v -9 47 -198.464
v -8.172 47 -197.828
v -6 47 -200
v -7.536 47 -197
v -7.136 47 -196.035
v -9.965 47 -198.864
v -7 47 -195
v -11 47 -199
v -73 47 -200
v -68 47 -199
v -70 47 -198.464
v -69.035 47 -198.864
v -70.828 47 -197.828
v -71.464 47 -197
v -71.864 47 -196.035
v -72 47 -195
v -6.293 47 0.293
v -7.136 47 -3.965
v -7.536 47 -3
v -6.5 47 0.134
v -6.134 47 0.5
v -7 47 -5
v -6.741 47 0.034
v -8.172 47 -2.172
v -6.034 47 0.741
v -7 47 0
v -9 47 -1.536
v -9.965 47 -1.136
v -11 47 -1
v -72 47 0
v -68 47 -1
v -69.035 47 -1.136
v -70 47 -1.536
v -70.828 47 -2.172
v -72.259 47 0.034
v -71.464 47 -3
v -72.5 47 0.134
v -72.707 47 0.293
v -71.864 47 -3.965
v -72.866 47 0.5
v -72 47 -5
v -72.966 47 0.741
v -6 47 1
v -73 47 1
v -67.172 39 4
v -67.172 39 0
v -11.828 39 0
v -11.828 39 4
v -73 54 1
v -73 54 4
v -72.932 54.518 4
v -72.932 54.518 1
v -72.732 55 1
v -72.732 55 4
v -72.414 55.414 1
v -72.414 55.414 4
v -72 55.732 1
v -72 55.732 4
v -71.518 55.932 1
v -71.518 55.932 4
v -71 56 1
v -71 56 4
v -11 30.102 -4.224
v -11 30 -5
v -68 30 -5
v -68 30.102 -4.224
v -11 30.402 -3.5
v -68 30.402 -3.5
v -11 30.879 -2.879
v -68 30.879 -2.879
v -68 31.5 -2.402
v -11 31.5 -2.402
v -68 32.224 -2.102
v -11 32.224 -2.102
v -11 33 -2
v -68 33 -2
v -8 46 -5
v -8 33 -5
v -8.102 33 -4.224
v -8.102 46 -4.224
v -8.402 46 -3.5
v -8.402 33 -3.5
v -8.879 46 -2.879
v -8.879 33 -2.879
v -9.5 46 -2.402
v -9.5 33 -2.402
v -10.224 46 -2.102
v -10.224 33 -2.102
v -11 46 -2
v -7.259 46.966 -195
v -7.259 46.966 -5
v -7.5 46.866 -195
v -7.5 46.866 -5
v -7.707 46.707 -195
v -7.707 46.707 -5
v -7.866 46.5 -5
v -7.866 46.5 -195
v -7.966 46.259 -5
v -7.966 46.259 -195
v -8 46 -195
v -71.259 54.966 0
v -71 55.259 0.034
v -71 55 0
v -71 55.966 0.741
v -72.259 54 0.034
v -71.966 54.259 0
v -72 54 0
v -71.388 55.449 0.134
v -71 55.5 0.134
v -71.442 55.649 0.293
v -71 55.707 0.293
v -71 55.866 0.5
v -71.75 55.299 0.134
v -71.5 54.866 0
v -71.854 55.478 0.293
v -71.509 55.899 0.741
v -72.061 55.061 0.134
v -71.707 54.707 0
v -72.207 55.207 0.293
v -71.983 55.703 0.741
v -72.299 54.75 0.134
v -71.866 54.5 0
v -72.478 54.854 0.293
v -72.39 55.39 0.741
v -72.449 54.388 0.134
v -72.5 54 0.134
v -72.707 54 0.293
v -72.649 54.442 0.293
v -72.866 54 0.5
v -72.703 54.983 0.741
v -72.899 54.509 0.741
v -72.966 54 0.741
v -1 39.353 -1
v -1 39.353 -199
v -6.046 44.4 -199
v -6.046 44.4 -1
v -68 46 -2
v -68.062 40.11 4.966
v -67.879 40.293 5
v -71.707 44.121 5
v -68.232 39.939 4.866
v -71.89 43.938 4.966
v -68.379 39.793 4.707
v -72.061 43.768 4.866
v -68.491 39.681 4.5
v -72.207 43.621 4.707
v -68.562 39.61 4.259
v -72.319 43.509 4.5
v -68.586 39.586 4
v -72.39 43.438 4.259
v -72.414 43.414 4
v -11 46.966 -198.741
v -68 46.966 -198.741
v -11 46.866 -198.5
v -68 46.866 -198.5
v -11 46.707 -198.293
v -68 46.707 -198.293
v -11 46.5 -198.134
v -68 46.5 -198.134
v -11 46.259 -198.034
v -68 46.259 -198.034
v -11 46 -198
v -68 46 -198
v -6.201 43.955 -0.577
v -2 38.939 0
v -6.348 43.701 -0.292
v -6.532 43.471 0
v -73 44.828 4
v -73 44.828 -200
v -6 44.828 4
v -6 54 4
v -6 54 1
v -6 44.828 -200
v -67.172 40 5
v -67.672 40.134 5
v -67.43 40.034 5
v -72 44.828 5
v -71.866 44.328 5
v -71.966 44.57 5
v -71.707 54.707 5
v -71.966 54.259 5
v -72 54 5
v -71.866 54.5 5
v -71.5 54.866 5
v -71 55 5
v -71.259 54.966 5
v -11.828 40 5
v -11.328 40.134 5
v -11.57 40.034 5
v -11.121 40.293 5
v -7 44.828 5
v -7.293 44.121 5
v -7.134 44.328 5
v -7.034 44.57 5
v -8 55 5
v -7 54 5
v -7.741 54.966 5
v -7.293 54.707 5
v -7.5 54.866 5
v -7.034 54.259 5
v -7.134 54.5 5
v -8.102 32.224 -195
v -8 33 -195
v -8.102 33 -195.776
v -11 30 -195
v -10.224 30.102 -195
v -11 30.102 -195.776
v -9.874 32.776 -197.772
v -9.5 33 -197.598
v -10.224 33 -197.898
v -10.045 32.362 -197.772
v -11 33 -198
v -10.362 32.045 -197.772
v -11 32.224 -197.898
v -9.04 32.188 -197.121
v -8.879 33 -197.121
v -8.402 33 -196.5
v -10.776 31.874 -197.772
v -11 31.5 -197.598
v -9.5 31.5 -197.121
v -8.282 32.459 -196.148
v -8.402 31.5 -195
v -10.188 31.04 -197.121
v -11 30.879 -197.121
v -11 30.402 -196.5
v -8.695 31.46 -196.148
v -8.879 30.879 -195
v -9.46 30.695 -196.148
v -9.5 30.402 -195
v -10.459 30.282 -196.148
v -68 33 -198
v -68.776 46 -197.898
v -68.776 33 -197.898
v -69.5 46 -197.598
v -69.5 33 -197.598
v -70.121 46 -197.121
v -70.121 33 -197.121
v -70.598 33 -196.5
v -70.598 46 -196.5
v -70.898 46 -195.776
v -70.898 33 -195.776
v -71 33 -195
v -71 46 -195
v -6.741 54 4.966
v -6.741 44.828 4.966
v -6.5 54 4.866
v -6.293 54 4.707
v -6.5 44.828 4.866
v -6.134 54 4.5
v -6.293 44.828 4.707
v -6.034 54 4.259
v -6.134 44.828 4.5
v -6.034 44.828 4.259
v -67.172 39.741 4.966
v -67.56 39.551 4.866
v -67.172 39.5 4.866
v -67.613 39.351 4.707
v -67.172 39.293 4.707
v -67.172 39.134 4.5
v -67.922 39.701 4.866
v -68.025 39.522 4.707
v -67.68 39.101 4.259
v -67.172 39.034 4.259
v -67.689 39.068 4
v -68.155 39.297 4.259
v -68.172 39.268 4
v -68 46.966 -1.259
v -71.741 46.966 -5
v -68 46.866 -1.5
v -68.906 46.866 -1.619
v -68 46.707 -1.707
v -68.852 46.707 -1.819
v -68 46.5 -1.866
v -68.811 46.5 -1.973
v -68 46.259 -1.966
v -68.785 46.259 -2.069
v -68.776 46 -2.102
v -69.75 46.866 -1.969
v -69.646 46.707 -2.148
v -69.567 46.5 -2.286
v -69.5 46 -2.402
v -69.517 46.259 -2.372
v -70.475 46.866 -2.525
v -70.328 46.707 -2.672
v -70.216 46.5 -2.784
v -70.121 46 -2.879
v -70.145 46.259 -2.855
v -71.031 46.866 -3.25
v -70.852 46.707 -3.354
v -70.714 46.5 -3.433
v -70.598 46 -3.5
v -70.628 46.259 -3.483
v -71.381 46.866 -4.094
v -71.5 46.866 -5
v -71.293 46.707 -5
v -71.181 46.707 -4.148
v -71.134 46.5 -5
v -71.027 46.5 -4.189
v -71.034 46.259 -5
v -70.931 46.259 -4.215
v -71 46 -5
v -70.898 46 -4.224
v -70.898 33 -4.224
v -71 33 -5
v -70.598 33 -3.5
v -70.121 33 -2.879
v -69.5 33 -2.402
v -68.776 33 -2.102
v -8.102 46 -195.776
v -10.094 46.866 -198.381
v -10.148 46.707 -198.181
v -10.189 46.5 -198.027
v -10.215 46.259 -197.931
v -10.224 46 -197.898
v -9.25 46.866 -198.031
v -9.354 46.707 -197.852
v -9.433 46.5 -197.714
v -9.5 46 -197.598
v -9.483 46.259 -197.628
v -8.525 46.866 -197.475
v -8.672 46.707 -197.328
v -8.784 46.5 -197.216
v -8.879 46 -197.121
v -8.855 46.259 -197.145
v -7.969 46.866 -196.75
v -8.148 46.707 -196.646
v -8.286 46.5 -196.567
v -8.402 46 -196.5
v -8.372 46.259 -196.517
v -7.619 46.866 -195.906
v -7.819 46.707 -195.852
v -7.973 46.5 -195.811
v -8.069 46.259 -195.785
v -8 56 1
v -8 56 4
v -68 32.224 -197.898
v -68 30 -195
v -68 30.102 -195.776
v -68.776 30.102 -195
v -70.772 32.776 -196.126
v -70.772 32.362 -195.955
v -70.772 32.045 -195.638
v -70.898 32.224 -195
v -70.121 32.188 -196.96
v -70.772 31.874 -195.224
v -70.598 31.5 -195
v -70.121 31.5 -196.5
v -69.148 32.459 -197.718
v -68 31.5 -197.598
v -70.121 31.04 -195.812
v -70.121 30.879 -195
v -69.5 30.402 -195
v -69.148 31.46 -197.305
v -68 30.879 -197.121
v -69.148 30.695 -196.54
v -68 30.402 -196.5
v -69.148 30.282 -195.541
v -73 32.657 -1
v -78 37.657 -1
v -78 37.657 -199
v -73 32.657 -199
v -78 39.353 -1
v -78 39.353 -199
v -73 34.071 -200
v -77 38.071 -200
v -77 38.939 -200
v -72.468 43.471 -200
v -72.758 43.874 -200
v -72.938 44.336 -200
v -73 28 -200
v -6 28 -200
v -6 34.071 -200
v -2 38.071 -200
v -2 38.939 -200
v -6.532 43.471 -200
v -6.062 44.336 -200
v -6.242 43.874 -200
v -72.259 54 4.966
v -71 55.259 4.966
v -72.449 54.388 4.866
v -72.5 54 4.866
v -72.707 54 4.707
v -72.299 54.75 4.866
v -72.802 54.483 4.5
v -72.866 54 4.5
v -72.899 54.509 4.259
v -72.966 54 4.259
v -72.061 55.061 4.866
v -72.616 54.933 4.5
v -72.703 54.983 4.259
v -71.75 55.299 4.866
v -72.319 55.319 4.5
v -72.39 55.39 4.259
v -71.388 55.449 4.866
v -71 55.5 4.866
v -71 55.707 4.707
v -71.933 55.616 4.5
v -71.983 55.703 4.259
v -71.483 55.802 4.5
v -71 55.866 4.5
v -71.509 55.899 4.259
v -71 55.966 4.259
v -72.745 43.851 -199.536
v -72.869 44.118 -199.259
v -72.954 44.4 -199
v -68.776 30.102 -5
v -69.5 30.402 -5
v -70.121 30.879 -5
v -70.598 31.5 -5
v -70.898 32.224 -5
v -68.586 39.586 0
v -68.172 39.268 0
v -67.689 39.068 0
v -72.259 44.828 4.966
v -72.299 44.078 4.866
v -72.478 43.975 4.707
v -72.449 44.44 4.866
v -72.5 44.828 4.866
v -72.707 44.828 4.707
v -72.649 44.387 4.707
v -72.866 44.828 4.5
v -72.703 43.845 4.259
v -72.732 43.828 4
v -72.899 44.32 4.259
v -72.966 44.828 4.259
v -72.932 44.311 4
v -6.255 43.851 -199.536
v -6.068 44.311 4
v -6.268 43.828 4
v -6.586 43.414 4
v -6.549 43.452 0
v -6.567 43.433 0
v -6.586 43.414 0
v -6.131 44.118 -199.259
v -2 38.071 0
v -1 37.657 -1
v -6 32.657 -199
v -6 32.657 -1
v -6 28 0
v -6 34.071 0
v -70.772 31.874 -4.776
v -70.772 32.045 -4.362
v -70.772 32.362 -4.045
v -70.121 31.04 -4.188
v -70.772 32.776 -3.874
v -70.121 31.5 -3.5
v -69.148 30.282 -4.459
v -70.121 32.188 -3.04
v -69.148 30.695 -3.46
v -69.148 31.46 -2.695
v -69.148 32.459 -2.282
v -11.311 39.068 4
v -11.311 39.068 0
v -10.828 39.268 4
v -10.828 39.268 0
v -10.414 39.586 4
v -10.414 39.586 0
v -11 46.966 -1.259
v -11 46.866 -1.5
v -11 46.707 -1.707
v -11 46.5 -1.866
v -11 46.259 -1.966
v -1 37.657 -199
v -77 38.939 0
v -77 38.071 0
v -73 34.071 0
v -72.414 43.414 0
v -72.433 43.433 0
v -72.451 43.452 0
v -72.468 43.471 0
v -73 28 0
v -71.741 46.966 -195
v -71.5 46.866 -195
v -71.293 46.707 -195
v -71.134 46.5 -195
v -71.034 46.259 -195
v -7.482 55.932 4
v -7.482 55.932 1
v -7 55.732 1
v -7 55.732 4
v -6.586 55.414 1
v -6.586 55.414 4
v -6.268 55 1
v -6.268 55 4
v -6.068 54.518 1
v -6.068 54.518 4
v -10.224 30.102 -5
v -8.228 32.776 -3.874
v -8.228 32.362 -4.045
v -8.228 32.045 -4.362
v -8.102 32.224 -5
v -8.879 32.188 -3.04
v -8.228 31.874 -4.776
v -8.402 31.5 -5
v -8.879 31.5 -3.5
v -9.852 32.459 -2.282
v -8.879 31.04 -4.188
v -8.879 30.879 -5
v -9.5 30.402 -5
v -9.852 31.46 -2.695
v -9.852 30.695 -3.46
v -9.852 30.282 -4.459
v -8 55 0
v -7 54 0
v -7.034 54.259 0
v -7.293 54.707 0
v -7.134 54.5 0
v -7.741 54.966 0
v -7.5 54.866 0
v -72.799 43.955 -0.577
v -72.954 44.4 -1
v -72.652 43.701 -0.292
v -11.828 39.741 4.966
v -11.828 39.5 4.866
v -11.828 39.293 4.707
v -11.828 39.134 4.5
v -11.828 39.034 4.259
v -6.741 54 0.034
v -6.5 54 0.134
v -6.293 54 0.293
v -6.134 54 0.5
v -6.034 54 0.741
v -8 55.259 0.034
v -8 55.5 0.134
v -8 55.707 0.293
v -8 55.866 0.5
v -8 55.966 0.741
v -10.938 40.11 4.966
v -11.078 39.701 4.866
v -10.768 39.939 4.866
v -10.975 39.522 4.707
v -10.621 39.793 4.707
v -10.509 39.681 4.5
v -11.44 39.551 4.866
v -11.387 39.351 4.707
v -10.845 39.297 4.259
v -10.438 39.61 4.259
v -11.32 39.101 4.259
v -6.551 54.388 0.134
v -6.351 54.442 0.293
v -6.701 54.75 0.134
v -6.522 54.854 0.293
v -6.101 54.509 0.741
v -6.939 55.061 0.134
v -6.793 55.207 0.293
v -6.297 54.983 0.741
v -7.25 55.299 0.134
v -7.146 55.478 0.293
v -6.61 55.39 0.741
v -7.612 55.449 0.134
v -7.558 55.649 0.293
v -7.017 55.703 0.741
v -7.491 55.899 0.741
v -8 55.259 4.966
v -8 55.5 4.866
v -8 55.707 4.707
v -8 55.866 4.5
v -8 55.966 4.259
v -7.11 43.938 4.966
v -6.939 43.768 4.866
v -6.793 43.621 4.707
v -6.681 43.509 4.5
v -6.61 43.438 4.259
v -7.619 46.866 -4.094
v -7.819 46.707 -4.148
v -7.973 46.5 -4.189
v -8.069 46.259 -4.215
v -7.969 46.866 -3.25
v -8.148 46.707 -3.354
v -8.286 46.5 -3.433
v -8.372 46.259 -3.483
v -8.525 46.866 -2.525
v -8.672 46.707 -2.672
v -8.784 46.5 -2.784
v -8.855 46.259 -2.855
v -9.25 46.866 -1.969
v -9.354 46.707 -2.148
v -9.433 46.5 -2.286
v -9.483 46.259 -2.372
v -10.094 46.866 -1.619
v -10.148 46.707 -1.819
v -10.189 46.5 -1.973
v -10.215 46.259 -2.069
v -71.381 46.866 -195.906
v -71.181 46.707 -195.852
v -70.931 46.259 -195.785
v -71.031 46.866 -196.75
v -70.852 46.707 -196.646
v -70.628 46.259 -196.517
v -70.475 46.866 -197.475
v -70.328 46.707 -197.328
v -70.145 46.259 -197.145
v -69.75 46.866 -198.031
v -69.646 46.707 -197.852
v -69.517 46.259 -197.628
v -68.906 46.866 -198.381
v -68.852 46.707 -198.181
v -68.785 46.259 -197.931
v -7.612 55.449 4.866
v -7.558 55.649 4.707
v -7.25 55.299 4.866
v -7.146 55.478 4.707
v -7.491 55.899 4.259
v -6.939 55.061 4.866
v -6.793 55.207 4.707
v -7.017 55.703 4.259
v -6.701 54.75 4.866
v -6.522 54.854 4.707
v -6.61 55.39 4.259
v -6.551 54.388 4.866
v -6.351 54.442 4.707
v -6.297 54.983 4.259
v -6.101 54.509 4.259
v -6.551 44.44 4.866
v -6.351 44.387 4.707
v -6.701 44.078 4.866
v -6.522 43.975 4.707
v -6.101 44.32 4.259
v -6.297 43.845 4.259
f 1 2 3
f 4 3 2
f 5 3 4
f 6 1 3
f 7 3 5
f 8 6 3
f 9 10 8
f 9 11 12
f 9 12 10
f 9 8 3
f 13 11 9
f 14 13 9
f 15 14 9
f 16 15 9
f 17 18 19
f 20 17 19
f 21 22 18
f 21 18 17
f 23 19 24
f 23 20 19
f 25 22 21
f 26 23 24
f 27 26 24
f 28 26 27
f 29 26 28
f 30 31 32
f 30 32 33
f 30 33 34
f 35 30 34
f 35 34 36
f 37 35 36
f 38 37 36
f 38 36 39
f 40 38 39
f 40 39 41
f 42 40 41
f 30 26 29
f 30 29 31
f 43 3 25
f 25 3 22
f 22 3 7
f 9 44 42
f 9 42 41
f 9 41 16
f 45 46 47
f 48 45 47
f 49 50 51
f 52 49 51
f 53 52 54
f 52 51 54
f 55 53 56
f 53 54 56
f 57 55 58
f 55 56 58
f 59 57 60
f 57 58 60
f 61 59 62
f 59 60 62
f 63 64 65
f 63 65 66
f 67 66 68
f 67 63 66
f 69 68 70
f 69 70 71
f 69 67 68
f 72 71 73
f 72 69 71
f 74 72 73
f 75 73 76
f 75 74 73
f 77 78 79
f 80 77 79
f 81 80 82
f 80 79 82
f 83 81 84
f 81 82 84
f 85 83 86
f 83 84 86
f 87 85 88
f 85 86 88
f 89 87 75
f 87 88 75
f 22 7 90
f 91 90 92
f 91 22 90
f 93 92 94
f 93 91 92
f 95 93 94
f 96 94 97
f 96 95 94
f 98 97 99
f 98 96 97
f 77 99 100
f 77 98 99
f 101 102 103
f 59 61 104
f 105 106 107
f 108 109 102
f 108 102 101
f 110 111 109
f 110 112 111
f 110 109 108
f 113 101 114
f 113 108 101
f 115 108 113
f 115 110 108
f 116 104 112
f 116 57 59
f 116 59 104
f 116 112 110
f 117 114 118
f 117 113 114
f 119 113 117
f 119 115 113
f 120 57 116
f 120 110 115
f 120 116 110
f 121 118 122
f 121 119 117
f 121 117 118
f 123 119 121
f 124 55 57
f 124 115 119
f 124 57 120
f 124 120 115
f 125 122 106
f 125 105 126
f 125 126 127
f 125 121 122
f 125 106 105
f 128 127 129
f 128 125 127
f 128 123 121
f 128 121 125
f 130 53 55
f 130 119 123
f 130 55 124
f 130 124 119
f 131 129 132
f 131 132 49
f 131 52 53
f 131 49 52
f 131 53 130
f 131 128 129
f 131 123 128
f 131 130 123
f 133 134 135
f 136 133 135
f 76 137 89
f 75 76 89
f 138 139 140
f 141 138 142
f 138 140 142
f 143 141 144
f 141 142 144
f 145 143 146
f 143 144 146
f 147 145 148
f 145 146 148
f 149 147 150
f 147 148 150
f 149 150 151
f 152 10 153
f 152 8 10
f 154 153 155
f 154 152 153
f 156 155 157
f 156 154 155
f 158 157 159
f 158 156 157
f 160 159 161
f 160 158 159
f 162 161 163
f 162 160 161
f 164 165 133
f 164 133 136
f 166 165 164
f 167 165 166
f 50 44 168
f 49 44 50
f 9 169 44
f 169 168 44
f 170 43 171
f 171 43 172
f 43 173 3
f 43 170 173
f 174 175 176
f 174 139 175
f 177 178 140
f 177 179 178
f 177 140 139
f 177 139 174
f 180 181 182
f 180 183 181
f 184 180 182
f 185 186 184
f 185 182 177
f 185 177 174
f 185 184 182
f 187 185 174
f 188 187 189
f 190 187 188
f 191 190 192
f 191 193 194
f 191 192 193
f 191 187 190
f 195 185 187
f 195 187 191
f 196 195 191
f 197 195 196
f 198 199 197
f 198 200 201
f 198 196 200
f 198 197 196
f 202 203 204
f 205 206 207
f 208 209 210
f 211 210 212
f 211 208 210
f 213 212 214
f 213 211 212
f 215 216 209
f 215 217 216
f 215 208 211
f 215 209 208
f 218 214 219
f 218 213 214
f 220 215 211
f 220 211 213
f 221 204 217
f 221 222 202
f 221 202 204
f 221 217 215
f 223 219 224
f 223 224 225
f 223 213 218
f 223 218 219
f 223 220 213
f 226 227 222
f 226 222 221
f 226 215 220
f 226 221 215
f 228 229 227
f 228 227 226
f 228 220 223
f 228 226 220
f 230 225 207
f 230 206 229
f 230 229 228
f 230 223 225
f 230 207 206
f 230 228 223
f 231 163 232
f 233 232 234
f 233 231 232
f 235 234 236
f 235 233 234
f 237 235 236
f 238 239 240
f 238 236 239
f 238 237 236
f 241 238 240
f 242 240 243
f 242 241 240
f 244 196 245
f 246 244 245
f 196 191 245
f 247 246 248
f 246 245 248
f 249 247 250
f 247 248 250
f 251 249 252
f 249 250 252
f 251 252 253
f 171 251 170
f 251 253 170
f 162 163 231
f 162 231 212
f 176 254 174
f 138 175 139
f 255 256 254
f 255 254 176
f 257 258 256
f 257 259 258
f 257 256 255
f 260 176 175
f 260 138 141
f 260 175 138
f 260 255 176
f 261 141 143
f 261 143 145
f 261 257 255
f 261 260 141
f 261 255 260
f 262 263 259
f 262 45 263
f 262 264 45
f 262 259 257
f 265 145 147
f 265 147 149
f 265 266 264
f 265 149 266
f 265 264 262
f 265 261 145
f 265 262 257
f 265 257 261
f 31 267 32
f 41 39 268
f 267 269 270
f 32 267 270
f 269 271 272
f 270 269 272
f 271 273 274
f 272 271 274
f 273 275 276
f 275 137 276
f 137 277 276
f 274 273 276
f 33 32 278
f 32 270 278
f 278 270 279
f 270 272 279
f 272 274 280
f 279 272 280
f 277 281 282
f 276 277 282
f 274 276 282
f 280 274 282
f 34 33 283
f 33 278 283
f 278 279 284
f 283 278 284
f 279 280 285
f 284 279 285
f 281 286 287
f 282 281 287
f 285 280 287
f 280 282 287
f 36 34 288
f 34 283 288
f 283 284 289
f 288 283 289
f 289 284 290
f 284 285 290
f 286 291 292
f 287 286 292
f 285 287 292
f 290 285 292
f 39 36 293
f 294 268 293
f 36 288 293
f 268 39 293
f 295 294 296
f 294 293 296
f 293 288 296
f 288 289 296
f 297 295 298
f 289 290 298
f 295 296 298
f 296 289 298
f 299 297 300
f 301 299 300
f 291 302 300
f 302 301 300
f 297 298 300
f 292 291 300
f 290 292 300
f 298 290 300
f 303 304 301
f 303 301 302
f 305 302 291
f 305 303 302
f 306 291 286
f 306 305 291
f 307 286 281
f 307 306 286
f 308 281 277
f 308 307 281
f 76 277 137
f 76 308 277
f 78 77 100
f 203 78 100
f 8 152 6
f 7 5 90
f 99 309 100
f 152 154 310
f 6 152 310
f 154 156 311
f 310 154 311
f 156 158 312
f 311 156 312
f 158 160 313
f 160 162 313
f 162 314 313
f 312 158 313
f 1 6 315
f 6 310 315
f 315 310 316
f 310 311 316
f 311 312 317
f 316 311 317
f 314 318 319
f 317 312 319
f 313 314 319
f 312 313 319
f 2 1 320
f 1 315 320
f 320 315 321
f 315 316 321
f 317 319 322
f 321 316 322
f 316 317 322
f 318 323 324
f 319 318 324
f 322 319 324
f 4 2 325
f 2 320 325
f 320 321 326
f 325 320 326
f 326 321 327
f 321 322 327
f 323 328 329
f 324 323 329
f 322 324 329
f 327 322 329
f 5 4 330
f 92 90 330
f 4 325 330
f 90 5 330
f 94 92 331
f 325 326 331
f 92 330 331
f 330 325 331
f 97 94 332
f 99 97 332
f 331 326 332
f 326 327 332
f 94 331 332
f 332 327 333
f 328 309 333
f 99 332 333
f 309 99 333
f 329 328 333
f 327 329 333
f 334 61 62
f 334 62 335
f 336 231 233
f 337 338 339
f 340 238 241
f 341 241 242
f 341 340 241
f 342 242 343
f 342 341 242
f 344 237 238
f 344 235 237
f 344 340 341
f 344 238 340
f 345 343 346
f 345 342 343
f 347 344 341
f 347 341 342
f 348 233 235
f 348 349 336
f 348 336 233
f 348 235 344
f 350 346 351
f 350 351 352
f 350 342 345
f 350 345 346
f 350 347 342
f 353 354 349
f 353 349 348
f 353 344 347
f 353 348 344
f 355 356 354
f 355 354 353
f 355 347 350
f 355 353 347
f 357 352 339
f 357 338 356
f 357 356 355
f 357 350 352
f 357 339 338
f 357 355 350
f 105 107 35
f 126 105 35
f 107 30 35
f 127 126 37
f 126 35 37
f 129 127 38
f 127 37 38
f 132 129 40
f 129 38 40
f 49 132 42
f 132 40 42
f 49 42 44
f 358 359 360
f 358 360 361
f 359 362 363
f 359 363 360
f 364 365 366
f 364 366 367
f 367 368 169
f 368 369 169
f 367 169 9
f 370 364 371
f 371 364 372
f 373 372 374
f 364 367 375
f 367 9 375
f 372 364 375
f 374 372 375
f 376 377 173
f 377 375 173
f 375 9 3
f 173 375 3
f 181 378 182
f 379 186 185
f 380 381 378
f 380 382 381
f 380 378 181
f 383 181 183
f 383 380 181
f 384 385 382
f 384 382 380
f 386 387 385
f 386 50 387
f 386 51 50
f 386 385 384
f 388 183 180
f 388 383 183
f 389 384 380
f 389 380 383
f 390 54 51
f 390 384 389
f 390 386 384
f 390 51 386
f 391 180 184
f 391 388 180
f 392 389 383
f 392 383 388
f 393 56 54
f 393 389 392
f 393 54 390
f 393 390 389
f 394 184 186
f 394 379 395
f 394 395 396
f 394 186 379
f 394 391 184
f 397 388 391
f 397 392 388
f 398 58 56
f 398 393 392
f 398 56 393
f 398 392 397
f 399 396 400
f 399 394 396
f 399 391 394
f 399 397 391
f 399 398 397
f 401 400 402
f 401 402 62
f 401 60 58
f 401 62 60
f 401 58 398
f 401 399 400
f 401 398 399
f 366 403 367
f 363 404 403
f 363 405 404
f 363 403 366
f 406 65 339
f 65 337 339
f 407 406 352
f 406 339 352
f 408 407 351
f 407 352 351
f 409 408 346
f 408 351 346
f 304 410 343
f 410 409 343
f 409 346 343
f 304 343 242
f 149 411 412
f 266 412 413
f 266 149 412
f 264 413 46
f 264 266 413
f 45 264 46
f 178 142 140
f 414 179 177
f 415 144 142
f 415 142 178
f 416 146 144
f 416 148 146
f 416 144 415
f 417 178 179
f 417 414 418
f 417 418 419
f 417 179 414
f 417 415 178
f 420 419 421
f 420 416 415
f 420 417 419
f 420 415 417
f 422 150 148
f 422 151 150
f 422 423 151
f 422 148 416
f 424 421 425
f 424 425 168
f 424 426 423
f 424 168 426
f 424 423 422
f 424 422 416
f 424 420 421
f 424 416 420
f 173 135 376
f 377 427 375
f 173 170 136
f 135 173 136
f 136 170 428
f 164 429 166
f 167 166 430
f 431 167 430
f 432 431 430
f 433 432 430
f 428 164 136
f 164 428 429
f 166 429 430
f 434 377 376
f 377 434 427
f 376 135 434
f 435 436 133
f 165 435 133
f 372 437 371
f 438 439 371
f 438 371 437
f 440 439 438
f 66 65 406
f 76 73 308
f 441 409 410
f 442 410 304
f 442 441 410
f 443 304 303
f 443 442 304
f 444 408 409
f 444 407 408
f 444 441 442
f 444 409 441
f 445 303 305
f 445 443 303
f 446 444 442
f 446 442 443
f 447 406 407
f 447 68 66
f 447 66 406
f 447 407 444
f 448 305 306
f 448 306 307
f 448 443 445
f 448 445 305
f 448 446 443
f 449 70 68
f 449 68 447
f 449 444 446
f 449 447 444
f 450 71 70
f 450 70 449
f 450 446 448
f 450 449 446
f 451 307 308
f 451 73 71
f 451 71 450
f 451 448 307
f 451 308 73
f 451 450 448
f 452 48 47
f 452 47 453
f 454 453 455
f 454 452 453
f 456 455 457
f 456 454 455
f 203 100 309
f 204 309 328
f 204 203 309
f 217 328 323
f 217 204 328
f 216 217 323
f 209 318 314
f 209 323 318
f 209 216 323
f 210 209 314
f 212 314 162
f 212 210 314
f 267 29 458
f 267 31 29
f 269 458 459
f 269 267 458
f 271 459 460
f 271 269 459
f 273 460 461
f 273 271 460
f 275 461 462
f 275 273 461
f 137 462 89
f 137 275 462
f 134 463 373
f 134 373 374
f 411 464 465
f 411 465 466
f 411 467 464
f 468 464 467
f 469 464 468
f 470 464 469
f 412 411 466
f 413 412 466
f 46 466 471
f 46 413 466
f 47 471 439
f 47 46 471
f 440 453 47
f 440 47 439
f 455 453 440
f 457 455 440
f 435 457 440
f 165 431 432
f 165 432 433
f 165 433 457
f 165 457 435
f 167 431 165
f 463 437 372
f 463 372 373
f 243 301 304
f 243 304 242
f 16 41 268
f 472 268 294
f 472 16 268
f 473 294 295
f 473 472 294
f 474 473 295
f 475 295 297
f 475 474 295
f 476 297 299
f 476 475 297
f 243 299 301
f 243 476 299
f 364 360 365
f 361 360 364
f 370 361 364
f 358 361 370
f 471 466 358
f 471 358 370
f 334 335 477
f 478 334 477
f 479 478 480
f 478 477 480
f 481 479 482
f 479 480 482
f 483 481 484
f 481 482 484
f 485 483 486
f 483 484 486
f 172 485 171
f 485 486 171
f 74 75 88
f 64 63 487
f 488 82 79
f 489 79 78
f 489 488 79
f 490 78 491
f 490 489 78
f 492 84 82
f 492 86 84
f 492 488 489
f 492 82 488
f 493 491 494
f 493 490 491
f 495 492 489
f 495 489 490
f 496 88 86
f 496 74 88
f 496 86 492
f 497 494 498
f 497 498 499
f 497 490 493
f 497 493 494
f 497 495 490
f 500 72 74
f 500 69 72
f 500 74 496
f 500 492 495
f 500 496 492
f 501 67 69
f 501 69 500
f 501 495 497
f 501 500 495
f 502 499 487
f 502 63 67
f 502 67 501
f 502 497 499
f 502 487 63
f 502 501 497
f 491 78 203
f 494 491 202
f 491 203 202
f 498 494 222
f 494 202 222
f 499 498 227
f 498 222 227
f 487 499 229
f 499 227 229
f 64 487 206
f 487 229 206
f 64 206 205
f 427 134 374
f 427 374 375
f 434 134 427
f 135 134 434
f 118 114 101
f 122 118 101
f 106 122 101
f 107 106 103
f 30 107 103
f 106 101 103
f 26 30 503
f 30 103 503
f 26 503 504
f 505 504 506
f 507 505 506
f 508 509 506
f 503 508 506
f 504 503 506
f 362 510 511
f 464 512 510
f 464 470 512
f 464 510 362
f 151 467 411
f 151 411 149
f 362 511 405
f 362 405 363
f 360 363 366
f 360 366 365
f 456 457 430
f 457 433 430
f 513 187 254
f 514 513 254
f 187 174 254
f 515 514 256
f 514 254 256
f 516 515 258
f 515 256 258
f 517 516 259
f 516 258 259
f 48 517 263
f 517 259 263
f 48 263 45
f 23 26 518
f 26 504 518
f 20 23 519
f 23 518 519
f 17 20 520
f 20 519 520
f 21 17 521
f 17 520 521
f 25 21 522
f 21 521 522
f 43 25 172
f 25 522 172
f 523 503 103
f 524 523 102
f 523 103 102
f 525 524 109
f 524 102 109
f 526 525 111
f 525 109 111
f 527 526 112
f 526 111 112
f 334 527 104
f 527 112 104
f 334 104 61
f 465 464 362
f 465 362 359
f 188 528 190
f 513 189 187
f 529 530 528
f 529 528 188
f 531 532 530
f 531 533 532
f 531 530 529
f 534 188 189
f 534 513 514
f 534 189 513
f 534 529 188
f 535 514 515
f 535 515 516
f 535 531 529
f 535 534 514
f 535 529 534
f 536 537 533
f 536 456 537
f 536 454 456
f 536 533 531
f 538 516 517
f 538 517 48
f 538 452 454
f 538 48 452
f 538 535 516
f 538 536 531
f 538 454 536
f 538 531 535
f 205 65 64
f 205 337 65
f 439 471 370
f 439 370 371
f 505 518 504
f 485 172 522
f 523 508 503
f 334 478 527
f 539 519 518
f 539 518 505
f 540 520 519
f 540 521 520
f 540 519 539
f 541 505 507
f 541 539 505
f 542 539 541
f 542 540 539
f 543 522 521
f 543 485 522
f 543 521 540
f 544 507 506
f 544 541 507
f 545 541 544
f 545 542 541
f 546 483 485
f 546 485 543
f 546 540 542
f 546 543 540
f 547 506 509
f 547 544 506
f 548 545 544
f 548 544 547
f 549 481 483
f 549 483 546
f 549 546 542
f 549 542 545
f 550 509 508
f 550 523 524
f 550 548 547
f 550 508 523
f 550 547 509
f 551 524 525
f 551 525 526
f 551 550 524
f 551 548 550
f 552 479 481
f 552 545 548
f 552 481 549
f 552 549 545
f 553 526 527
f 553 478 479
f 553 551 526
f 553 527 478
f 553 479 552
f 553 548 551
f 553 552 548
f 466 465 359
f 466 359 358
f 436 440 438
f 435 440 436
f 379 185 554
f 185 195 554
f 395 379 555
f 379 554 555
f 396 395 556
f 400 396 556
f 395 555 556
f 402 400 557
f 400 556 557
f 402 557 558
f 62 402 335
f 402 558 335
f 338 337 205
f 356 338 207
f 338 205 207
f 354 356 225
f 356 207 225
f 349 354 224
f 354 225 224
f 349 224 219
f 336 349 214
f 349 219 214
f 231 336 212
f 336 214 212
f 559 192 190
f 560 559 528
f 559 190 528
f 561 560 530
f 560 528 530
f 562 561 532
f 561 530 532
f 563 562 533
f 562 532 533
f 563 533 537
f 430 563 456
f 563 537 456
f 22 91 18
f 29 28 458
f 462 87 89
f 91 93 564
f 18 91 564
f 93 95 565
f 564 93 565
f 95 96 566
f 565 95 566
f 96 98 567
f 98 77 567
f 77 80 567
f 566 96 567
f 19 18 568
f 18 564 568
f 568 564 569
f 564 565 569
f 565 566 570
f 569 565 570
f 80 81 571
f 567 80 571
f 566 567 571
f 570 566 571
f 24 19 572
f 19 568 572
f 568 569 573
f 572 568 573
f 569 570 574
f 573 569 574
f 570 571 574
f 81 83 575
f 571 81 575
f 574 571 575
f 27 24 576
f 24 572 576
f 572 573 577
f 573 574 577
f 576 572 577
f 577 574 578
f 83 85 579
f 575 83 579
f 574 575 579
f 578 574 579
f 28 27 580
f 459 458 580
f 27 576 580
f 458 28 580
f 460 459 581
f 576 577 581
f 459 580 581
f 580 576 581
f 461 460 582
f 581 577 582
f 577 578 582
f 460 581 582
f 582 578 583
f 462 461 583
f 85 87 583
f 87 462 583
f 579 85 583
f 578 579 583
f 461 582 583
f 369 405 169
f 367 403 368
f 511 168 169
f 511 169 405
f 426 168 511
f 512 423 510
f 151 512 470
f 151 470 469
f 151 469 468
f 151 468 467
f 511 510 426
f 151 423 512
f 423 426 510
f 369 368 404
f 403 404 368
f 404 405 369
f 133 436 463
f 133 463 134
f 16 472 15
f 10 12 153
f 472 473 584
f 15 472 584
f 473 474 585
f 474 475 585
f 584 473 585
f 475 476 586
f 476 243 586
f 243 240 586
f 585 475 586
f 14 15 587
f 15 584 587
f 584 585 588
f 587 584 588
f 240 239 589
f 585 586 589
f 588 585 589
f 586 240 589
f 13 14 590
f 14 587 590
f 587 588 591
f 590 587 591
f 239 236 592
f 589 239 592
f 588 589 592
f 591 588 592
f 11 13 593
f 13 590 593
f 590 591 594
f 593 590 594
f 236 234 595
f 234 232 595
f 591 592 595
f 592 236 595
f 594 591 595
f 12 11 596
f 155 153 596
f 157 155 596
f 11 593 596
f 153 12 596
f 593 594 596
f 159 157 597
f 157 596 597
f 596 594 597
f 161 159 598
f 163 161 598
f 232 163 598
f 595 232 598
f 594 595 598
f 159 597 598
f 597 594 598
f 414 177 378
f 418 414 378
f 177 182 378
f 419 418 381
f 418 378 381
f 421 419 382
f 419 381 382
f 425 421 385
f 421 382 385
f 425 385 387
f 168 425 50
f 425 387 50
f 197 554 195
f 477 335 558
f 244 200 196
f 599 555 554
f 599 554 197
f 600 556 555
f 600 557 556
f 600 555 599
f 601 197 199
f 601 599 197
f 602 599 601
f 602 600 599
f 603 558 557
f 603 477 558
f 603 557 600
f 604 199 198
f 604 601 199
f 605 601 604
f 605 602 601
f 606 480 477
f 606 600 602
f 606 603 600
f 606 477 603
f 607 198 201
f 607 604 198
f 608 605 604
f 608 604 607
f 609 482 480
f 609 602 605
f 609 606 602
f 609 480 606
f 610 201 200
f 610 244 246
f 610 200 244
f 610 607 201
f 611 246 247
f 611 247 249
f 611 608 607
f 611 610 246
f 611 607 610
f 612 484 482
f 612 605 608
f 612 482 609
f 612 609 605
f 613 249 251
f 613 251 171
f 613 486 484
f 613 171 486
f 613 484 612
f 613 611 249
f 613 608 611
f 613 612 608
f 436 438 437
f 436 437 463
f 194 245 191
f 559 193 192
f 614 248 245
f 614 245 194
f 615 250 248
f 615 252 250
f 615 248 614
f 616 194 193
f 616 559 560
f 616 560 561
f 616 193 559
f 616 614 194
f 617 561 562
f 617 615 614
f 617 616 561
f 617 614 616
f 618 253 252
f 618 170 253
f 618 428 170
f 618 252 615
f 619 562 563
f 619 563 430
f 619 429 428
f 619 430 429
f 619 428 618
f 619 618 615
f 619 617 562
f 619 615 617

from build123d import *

# Parameters (mm, degrees)
EXTRUDE_1_DEPTH     = 200
SKETCH_2_W          = 63
SKETCH_2_H          = 196
CUT_EXTRUDE_1_DEPTH = 17
SKETCH_3_W          = 67
SKETCH_3_H          = 17
EXTRUDE_2_DEPTH     = 5
CHAMFER_1_SIZE      = 5
FILLET_1_R          = 2
FILLET_2_R          = 1
FILLET_3_R          = 3
FILLET_4_R          = 1
CHAMFER_2_SIZE      = 1


with BuildPart() as part:
    # 草图1 → 凸台-拉伸1 (new body)
    with BuildSketch(Plane.XY):
        Polygon((-73, 28), (-6, 28), (-6, 32.656854249), (-1, 37.656854249), (-1, 39.353196257), (-6, 44.353196257), (-6, 47), (-73, 47), (-73, 44.353196257), (-78, 39.353196257), (-78, 37.656854249), (-73, 32.656854249), align=None)
    extrude(amount=-EXTRUDE_1_DEPTH)

    # 草图2 → 切除-拉伸1 (cut)
    with BuildSketch(Plane(origin=(0, 47, 0), x_dir=(1, 0, 0), z_dir=(0, 1, 0))):
        with Locations((-39.5, 100)):
            Rectangle(SKETCH_2_W, SKETCH_2_H)
    extrude(amount=-CUT_EXTRUDE_1_DEPTH, mode=Mode.SUBTRACT)

    # 草图3 → 凸台-拉伸2 (add)
    with BuildSketch(Plane.XY):
        with Locations((-39.5, 47.5)):
            Rectangle(SKETCH_3_W, SKETCH_3_H)
    extrude(amount=EXTRUDE_2_DEPTH)

    # 倒角1
    chamfer_1_edges = [part.edges().sort_by_distance(p)[0] for p in [
        (-73, 39, 2.5),
        (-6, 39, 2.5),
    ]]
    chamfer(chamfer_1_edges, length=CHAMFER_1_SIZE)

    # 圆角1
    fillet_1_edges = [part.edges().sort_by_distance(p)[0] for p in [
        (-6, 56, 2.5),
        (-6, 44, 2.5),
        (-11, 39, 2.5),
        (-68, 39, 2.5),
        (-73, 44, 2.5),
        (-73, 56, 2.5),
    ]]
    fillet(fillet_1_edges, radius=FILLET_1_R)

    # 圆角2
    fillet_2_edges = [part.edges().sort_by_distance(p)[0] for p in [
        (-6, 50.5, 0),
        (-39.5, 56, 0),
        (-39.5, 56, 5),
        (-73, 50.5, 0),
        (-72.414213562, 55.414213562, 0),
        (-6.585786438, 55.414213562, 0),
        (-6, 49.414213562, 5),
        (-39.5, 39, 5),
        (-8.5, 41.5, 5),
        (-73, 49.414213562, 5),
        (-70.5, 41.5, 5),
        (-72.414213562, 55.414213562, 5),
        (-72.847759065, 44.06306026, 5),
        (-67.93693974, 39.152240935, 5),
        (-11.06306026, 39.152240935, 5),
        (-6.152240935, 44.06306026, 5),
        (-6.585786438, 55.414213562, 5),
    ]]
    fillet(fillet_2_edges, radius=FILLET_2_R)

    # 圆角3
    fillet_3_edges = [part.edges().sort_by_distance(p)[0] for p in [
        (-39.5, 30, -2),
        (-8, 38.5, -2),
        (-8, 30, -100),
        (-8, 38.5, -198),
        (-39.5, 30, -198),
        (-71, 38.5, -198),
        (-71, 30, -100),
        (-71, 38.5, -2),
    ]]
    fillet(fillet_3_edges, radius=FILLET_3_R)

    # 圆角4
    fillet_4_edges = [part.edges().sort_by_distance(p)[0] for p in [
        (-39.5, 47, -198),
        (-8, 47, -100),
        (-39.5, 47, -2),
        (-71, 47, -100),
        (-8.878679656, 47, -2.878679656),
        (-8.878679656, 47, -197.121320344),
        (-70.121320344, 47, -2.878679656),
        (-70.121320344, 47, -197.121320344),
    ]]
    fillet(fillet_4_edges, radius=FILLET_4_R)

    # 倒角2
    chamfer_2_edges = [part.edges().sort_by_distance(p)[0] for p in [
        (-75.5, 35.156854249, 0),
        (-78, 38.505025253, 0),
        (-75.476752896, 41.876443361, 0),
        (-3.523247104, 41.876443361, 0),
        (-1, 38.505025253, 0),
        (-3.5, 35.156854249, 0),
        (-3.5, 35.156854249, -200),
        (-1, 38.505025253, -200),
        (-3.523247104, 41.876443361, -200),
        (-75.476752896, 41.876443361, -200),
        (-78, 38.505025253, -200),
        (-75.5, 35.156854249, -200),
    ]]
    chamfer(chamfer_2_edges, length=CHAMFER_2_SIZE)


solid = part.part
